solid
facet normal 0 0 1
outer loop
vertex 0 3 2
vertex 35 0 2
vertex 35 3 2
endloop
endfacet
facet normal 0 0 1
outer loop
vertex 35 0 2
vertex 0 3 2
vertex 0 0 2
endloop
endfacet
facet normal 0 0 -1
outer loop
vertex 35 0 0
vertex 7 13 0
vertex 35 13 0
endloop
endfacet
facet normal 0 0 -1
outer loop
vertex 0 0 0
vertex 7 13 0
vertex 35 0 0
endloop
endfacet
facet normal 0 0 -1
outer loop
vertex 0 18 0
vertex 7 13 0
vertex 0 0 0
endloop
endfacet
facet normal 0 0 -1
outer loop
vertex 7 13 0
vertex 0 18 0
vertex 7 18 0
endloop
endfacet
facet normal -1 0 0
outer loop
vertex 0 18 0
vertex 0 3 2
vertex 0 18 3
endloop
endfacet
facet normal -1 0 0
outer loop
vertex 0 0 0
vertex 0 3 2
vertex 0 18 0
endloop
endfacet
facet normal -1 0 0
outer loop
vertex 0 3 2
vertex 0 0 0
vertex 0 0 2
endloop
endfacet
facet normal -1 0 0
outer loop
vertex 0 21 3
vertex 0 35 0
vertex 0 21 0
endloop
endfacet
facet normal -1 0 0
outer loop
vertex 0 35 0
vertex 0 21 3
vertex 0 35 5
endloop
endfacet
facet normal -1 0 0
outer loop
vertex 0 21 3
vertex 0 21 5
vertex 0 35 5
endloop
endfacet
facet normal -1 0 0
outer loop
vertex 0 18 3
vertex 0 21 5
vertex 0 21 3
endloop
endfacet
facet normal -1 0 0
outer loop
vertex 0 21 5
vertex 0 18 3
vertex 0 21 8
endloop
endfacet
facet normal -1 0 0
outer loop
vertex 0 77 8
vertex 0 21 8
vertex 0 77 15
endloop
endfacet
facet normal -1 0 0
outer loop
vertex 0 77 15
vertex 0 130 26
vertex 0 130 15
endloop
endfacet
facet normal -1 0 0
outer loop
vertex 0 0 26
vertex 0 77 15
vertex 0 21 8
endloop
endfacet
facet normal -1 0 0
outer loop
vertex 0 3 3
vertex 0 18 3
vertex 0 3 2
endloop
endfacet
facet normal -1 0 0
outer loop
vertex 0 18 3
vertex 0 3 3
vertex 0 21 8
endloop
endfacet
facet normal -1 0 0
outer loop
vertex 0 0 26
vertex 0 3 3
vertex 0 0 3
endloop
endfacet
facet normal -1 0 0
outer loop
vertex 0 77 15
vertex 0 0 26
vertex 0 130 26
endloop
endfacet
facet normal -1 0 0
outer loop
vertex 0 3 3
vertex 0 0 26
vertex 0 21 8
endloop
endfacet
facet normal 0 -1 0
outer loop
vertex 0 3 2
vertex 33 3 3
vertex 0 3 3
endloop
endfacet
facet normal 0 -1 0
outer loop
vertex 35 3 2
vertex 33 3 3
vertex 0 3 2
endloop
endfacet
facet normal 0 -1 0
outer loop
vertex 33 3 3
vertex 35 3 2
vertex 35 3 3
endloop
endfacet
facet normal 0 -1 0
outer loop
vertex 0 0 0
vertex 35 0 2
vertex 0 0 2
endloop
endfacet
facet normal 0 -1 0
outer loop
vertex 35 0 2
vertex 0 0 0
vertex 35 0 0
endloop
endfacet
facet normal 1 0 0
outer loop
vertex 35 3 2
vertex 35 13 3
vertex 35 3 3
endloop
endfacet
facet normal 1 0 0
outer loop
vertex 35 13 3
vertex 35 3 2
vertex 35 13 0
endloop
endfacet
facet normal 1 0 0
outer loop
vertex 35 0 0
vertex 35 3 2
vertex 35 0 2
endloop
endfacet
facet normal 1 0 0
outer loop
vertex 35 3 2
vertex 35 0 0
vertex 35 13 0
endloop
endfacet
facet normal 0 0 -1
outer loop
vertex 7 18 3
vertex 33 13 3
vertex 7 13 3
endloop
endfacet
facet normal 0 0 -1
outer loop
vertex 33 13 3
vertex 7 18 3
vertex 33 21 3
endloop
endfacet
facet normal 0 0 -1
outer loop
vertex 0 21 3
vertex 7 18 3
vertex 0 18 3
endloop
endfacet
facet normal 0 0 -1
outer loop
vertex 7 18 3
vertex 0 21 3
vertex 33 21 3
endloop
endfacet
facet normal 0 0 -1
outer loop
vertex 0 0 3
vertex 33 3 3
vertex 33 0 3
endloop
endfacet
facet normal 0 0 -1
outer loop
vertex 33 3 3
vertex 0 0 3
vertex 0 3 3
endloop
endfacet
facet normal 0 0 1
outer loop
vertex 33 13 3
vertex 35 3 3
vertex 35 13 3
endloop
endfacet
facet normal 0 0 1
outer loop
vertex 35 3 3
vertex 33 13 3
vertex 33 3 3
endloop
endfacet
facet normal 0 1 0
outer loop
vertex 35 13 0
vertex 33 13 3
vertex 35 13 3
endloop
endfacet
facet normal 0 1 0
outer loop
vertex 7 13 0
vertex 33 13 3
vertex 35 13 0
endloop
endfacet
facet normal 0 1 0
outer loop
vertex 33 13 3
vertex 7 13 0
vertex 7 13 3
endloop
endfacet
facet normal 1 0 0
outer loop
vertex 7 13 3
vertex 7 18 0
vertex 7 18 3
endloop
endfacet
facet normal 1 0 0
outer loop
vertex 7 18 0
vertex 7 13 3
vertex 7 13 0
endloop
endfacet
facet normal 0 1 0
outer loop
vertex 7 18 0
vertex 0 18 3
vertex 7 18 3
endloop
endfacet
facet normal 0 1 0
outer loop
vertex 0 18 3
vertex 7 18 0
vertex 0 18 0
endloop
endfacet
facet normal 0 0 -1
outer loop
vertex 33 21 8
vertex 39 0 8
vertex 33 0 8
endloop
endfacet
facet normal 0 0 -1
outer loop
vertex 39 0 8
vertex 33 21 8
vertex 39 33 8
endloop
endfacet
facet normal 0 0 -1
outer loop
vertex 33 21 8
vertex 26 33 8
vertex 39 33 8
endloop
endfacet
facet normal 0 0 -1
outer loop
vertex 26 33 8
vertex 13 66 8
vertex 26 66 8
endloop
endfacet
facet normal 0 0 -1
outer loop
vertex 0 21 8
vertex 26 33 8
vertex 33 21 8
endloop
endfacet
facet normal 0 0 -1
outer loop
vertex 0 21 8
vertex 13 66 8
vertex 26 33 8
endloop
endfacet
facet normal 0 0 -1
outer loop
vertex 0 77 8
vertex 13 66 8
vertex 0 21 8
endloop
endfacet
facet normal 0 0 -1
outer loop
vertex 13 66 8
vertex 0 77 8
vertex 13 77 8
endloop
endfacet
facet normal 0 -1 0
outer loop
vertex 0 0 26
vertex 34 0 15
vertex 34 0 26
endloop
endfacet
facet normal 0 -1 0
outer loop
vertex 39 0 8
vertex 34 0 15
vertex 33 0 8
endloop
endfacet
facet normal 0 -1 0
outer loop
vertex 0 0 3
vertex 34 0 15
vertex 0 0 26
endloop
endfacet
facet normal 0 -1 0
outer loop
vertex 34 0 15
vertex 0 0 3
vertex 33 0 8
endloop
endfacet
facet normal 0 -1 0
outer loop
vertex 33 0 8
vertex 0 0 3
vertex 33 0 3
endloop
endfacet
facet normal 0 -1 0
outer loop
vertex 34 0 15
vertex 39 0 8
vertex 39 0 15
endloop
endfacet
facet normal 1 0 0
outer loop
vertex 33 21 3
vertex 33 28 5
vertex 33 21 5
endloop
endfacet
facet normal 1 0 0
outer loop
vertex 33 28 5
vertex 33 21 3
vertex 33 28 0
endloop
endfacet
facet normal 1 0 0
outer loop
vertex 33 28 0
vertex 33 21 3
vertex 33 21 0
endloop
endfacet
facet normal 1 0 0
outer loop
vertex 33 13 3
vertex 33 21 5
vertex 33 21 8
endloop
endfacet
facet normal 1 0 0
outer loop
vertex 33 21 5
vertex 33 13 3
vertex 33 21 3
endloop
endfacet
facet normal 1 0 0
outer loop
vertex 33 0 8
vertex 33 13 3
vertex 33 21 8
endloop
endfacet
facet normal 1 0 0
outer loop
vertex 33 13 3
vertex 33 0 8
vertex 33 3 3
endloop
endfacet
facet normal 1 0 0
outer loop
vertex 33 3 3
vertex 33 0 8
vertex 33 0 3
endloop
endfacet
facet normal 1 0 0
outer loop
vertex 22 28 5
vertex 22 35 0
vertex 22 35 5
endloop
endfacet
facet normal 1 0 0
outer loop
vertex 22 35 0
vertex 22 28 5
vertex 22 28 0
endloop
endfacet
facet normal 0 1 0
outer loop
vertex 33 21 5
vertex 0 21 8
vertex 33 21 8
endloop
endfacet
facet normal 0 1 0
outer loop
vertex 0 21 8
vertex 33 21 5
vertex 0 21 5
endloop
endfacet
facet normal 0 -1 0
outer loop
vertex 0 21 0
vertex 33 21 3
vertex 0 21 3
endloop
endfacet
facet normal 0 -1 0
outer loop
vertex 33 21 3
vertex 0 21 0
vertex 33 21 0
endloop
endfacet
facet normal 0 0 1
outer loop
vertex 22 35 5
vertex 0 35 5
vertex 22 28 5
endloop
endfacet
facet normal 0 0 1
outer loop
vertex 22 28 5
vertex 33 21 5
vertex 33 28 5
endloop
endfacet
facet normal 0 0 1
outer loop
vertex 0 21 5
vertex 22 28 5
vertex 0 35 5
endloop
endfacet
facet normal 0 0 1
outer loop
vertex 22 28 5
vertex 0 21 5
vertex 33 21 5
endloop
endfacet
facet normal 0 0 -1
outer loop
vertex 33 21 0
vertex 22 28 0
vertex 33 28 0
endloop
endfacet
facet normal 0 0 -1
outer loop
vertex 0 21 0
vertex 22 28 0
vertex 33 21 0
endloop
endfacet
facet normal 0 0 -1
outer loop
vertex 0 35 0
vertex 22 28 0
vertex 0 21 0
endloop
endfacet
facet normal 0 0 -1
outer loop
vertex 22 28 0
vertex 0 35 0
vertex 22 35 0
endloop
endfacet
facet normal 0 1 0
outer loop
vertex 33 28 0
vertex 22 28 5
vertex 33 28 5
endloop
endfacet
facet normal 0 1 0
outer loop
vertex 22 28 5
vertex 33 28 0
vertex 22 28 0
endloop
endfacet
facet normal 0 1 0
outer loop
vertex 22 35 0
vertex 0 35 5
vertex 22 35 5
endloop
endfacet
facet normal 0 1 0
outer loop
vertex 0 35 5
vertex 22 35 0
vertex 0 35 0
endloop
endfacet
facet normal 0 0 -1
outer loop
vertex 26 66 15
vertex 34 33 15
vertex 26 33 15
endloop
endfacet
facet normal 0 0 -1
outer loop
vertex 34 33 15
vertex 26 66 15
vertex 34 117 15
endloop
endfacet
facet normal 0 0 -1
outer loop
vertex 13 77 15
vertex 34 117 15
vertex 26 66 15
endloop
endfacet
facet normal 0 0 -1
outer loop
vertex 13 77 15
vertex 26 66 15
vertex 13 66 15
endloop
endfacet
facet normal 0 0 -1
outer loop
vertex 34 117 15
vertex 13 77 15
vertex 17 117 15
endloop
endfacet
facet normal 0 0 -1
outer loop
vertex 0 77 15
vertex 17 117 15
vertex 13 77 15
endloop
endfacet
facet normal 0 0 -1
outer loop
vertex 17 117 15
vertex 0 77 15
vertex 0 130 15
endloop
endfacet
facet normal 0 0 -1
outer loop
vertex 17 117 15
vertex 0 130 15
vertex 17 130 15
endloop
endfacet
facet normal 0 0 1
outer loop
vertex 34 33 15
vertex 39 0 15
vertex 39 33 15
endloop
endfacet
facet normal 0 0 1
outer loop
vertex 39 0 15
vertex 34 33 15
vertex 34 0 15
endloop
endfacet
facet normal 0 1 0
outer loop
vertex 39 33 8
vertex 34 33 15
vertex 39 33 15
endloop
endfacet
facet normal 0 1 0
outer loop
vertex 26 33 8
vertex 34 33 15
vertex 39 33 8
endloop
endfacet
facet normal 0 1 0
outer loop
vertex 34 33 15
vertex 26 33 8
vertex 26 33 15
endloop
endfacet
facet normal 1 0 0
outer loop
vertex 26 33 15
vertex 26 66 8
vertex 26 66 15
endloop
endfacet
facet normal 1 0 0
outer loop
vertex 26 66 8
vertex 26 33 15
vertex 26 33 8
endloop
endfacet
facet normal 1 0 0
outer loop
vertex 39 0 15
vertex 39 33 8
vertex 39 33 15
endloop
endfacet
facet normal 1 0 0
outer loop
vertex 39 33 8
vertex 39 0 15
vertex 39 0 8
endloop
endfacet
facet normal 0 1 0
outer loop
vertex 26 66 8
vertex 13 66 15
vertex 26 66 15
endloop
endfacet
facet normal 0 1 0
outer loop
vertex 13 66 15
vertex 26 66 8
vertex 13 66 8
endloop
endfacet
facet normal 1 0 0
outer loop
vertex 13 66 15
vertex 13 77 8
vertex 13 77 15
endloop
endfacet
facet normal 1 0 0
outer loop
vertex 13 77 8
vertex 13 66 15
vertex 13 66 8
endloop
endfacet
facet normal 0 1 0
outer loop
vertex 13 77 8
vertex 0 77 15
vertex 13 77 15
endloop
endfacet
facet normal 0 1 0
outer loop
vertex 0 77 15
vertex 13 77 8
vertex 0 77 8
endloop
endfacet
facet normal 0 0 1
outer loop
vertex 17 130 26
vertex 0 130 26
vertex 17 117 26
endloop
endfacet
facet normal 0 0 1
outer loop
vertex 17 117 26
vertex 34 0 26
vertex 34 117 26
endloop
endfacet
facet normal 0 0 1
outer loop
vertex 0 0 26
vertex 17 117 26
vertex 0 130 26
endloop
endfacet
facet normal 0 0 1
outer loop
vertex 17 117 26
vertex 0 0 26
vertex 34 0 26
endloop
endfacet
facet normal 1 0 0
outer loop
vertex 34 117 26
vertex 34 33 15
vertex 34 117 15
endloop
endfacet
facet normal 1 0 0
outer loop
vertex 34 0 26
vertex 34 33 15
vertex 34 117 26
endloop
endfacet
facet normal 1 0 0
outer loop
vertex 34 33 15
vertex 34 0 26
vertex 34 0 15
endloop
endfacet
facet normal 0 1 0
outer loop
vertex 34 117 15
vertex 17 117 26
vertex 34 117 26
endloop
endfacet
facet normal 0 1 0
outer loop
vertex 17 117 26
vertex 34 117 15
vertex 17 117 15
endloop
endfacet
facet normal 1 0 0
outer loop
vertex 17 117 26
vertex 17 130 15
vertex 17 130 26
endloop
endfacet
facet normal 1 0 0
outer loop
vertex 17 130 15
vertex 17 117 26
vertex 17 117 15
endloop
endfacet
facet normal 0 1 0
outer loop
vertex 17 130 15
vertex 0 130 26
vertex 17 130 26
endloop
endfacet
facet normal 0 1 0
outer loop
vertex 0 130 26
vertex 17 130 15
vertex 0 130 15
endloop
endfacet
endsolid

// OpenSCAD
translate([2.5, 1.5, 1.0]) color([0.4662789582213983, 0.458882332198567, 0.10148050986892876]) cube([5, 3, 2], center=true);
translate([7.5, 1.5, 1.0]) color([0.7781483542276006, 0.02022807324279441, 0.5983002604350479]) cube([5, 3, 2], center=true);
translate([12.5, 1.5, 1.0]) color([0.13270195297871745, 0.3239113547302247, 0.7000796910311562]) cube([5, 3, 2], center=true);
translate([17.5, 1.5, 1.0]) color([0.6489922579129634, 0.19497362064878687, 0.7834169698984913]) cube([5, 3, 2], center=true);
translate([22.5, 1.5, 1.0]) color([0.7774609885388588, 0.11099692345616674, 0.060160827712116616]) cube([5, 3, 2], center=true);
translate([27.5, 1.5, 1.0]) color([0.7008174245595068, 0.6143308403515266, 0.9339155207415325]) cube([5, 3, 2], center=true);
translate([32.5, 1.5, 1.0]) color([0.6504721799814983, 0.9694854220936419, 0.7136168898793864]) cube([5, 3, 2], center=true);
translate([3.5, 5.5, 1.5]) color([0.2963863893491513, 0.8491315553121948, 0.95846907728749]) cube([7, 5, 3], center=true);
translate([10.5, 5.5, 1.5]) color([0.38764569013819994, 0.29380353478258403, 0.7457841029207014]) cube([7, 5, 3], center=true);
translate([17.5, 5.5, 1.5]) color([0.9575468650535228, 0.98339807845839, 0.12155240415787172]) cube([7, 5, 3], center=true);
translate([24.5, 5.5, 1.5]) color([0.8604321836344089, 0.9958411320233901, 0.03818441020037311]) cube([7, 5, 3], center=true);
translate([31.5, 5.5, 1.5]) color([0.39202639046743215, 0.3715816420064585, 0.19047756087385292]) cube([7, 5, 3], center=true);
translate([3.5, 10.5, 1.5]) color([0.3565538137373233, 0.6320134108911423, 0.9564975354421206]) cube([7, 5, 3], center=true);
translate([10.5, 10.5, 1.5]) color([0.901927522825372, 0.039980675922074105, 0.2553863294502452]) cube([7, 5, 3], center=true);
translate([17.5, 10.5, 1.5]) color([0.02665600139486224, 0.5200631817170318, 0.5692567569896342]) cube([7, 5, 3], center=true);
translate([24.5, 10.5, 1.5]) color([0.8758772851227178, 0.2296552367022351, 0.7763426439418957]) cube([7, 5, 3], center=true);
translate([31.5, 10.5, 1.5]) color([0.8846860519705121, 0.6274277551427163, 0.5024128608294012]) cube([7, 5, 3], center=true);
translate([3.5, 15.5, 1.5]) color([0.5237115354844265, 0.5071067236759631, 0.9454855480301745]) cube([7, 5, 3], center=true);
translate([5.5, 3.5, 5.5]) color([0.14569042195357562, 0.8918421087116969, 0.42205651792049836]) cube([11, 7, 5], center=true);
translate([16.5, 3.5, 5.5]) color([0.08403205823715598, 0.1047646210762947, 0.06292282863863541]) cube([11, 7, 5], center=true);
translate([27.5, 3.5, 5.5]) color([0.4151614515022839, 0.15615697007089357, 0.9545538427732947]) cube([11, 7, 5], center=true);
translate([5.5, 10.5, 5.5]) color([0.7913428503775491, 0.43108631436838285, 0.41701950900356644]) cube([11, 7, 5], center=true);
translate([16.5, 10.5, 5.5]) color([0.4966247746294912, 0.86405767472269, 0.32449912818180593]) cube([11, 7, 5], center=true);
translate([27.5, 10.5, 5.5]) color([0.25258592574699623, 0.35250302456564797, 0.12137799977699892]) cube([11, 7, 5], center=true);
translate([5.5, 17.5, 5.5]) color([0.691775150815975, 0.34544510653523897, 0.17790766067776254]) cube([11, 7, 5], center=true);
translate([16.5, 17.5, 5.5]) color([0.830270051764872, 0.23049353673314077, 0.3658024748453319]) cube([11, 7, 5], center=true);
translate([27.5, 17.5, 5.5]) color([0.5965890354919068, 0.14329113966210216, 0.003232100641658797]) cube([11, 7, 5], center=true);
translate([5.5, 24.5, 2.5]) color([0.6590184917581017, 0.7321014772226084, 0.9009039411186286]) cube([11, 7, 5], center=true);
translate([16.5, 24.5, 2.5]) color([0.7479768172441763, 0.29326295382626455, 0.6894664766240866]) cube([11, 7, 5], center=true);
translate([27.5, 24.5, 2.5]) color([0.932788033819558, 0.23286310478430694, 0.14188743522012004]) cube([11, 7, 5], center=true);
translate([5.5, 31.5, 2.5]) color([0.4540480681686925, 0.4766939084563374, 0.7074804824528956]) cube([11, 7, 5], center=true);
translate([16.5, 31.5, 2.5]) color([0.2582188407343454, 0.027936242271358158, 0.20812012525081536]) cube([11, 7, 5], center=true);
translate([6.5, 5.5, 11.5]) color([0.33501316214628807, 0.9609071038114427, 0.29634664160852753]) cube([13, 11, 7], center=true);
translate([19.5, 5.5, 11.5]) color([0.8784103092413238, 0.5532045188241876, 0.32698413866792275]) cube([13, 11, 7], center=true);
translate([6.5, 16.5, 11.5]) color([0.5930193960141523, 0.08080901281968078, 0.5332278801564081]) cube([13, 11, 7], center=true);
translate([19.5, 16.5, 11.5]) color([0.30776249733867533, 0.3765889324074634, 0.14692685712634312]) cube([13, 11, 7], center=true);
translate([6.5, 27.5, 11.5]) color([0.1252359956830017, 0.2228174233130471, 0.5083324480268261]) cube([13, 11, 7], center=true);
translate([19.5, 27.5, 11.5]) color([0.23665719296677712, 0.18394442119493715, 0.3724619255943996]) cube([13, 11, 7], center=true);
translate([6.5, 38.5, 11.5]) color([0.6631955135334705, 0.8609746033864751, 0.6012082175951422]) cube([13, 11, 7], center=true);
translate([19.5, 38.5, 11.5]) color([0.3938011681878649, 0.7021695231885549, 0.13202027544551864]) cube([13, 11, 7], center=true);
translate([32.5, 5.5, 11.5]) color([0.29938666187805807, 0.4167493264442593, 0.9263964007964989]) cube([13, 11, 7], center=true);
translate([6.5, 49.5, 11.5]) color([0.5910765187605377, 0.2980281087530109, 0.35456411603507165]) cube([13, 11, 7], center=true);
translate([19.5, 49.5, 11.5]) color([0.24805850121983253, 0.6327789974902275, 0.6370445113549524]) cube([13, 11, 7], center=true);
translate([32.5, 16.5, 11.5]) color([0.5292072971005523, 0.376431751315491, 0.008427608141492793]) cube([13, 11, 7], center=true);
translate([6.5, 60.5, 11.5]) color([0.9619565585865117, 0.901262330417864, 0.44129738363616366]) cube([13, 11, 7], center=true);
translate([19.5, 60.5, 11.5]) color([0.3715965769686672, 0.9523409342086877, 0.09105648808381206]) cube([13, 11, 7], center=true);
translate([32.5, 27.5, 11.5]) color([0.18545820412424963, 0.10861526636012075, 0.11215874223546374]) cube([13, 11, 7], center=true);
translate([6.5, 71.5, 11.5]) color([0.6055458611860893, 0.15387883630139487, 0.7025980908137885]) cube([13, 11, 7], center=true);
translate([8.5, 6.5, 20.5]) color([0.928268212070889, 0.18538068806857422, 0.42170431041506296]) cube([17, 13, 11], center=true);
translate([25.5, 6.5, 20.5]) color([0.1747372019883816, 0.9595322940755414, 0.3403879026852894]) cube([17, 13, 11], center=true);
translate([8.5, 19.5, 20.5]) color([0.5233486454380116, 0.35536744790103547, 0.6315169232882821]) cube([17, 13, 11], center=true);
translate([25.5, 19.5, 20.5]) color([0.08649939658707362, 0.7550350740823142, 0.2947283238309857]) cube([17, 13, 11], center=true);
translate([8.5, 32.5, 20.5]) color([0.8301737658604361, 0.4490883769000732, 0.4620108455998946]) cube([17, 13, 11], center=true);
translate([25.5, 32.5, 20.5]) color([0.2187341846418389, 0.11445722556586746, 0.9788025142917065]) cube([17, 13, 11], center=true);
translate([8.5, 45.5, 20.5]) color([0.3011589686960586, 0.6091605287508749, 0.4242090709976407]) cube([17, 13, 11], center=true);
translate([25.5, 45.5, 20.5]) color([0.7513524999576429, 0.09255304692818778, 0.4976795968420046]) cube([17, 13, 11], center=true);
translate([8.5, 58.5, 20.5]) color([0.9609180855182016, 0.5437408220916614, 0.405305104554358]) cube([17, 13, 11], center=true);
translate([25.5, 58.5, 20.5]) color([0.6320656015278037, 0.0216193804206819, 0.2700784048715086]) cube([17, 13, 11], center=true);
translate([8.5, 71.5, 20.5]) color([0.6684886667173141, 0.0002532098932251925, 0.3984286079265319]) cube([17, 13, 11], center=true);
translate([25.5, 71.5, 20.5]) color([0.8905618085087551, 0.7099647178965433, 0.4445845492335537]) cube([17, 13, 11], center=true);
translate([8.5, 84.5, 20.5]) color([0.7465509493098265, 0.35382203223851694, 0.8712980207444939]) cube([17, 13, 11], center=true);
translate([25.5, 84.5, 20.5]) color([0.6725473918674463, 0.19603088941730495, 0.08525923665948931]) cube([17, 13, 11], center=true);
translate([8.5, 97.5, 20.5]) color([0.0704556688087915, 0.26248678792717994, 0.533638651221174]) cube([17, 13, 11], center=true);
translate([25.5, 97.5, 20.5]) color([0.11818482376773232, 0.8594532404023933, 0.8906989166138923]) cube([17, 13, 11], center=true);
translate([8.5, 110.5, 20.5]) color([0.7620005545284954, 0.06809296768032302, 0.8609410769469436]) cube([17, 13, 11], center=true);
translate([25.5, 110.5, 20.5]) color([0.2827478909480132, 0.13442052583382869, 0.5230599837537087]) cube([17, 13, 11], center=true);
translate([8.5, 123.5, 20.5]) color([0.21027834364306774, 0.10530639745894443, 0.9556548717215211]) cube([17, 13, 11], center=true);
